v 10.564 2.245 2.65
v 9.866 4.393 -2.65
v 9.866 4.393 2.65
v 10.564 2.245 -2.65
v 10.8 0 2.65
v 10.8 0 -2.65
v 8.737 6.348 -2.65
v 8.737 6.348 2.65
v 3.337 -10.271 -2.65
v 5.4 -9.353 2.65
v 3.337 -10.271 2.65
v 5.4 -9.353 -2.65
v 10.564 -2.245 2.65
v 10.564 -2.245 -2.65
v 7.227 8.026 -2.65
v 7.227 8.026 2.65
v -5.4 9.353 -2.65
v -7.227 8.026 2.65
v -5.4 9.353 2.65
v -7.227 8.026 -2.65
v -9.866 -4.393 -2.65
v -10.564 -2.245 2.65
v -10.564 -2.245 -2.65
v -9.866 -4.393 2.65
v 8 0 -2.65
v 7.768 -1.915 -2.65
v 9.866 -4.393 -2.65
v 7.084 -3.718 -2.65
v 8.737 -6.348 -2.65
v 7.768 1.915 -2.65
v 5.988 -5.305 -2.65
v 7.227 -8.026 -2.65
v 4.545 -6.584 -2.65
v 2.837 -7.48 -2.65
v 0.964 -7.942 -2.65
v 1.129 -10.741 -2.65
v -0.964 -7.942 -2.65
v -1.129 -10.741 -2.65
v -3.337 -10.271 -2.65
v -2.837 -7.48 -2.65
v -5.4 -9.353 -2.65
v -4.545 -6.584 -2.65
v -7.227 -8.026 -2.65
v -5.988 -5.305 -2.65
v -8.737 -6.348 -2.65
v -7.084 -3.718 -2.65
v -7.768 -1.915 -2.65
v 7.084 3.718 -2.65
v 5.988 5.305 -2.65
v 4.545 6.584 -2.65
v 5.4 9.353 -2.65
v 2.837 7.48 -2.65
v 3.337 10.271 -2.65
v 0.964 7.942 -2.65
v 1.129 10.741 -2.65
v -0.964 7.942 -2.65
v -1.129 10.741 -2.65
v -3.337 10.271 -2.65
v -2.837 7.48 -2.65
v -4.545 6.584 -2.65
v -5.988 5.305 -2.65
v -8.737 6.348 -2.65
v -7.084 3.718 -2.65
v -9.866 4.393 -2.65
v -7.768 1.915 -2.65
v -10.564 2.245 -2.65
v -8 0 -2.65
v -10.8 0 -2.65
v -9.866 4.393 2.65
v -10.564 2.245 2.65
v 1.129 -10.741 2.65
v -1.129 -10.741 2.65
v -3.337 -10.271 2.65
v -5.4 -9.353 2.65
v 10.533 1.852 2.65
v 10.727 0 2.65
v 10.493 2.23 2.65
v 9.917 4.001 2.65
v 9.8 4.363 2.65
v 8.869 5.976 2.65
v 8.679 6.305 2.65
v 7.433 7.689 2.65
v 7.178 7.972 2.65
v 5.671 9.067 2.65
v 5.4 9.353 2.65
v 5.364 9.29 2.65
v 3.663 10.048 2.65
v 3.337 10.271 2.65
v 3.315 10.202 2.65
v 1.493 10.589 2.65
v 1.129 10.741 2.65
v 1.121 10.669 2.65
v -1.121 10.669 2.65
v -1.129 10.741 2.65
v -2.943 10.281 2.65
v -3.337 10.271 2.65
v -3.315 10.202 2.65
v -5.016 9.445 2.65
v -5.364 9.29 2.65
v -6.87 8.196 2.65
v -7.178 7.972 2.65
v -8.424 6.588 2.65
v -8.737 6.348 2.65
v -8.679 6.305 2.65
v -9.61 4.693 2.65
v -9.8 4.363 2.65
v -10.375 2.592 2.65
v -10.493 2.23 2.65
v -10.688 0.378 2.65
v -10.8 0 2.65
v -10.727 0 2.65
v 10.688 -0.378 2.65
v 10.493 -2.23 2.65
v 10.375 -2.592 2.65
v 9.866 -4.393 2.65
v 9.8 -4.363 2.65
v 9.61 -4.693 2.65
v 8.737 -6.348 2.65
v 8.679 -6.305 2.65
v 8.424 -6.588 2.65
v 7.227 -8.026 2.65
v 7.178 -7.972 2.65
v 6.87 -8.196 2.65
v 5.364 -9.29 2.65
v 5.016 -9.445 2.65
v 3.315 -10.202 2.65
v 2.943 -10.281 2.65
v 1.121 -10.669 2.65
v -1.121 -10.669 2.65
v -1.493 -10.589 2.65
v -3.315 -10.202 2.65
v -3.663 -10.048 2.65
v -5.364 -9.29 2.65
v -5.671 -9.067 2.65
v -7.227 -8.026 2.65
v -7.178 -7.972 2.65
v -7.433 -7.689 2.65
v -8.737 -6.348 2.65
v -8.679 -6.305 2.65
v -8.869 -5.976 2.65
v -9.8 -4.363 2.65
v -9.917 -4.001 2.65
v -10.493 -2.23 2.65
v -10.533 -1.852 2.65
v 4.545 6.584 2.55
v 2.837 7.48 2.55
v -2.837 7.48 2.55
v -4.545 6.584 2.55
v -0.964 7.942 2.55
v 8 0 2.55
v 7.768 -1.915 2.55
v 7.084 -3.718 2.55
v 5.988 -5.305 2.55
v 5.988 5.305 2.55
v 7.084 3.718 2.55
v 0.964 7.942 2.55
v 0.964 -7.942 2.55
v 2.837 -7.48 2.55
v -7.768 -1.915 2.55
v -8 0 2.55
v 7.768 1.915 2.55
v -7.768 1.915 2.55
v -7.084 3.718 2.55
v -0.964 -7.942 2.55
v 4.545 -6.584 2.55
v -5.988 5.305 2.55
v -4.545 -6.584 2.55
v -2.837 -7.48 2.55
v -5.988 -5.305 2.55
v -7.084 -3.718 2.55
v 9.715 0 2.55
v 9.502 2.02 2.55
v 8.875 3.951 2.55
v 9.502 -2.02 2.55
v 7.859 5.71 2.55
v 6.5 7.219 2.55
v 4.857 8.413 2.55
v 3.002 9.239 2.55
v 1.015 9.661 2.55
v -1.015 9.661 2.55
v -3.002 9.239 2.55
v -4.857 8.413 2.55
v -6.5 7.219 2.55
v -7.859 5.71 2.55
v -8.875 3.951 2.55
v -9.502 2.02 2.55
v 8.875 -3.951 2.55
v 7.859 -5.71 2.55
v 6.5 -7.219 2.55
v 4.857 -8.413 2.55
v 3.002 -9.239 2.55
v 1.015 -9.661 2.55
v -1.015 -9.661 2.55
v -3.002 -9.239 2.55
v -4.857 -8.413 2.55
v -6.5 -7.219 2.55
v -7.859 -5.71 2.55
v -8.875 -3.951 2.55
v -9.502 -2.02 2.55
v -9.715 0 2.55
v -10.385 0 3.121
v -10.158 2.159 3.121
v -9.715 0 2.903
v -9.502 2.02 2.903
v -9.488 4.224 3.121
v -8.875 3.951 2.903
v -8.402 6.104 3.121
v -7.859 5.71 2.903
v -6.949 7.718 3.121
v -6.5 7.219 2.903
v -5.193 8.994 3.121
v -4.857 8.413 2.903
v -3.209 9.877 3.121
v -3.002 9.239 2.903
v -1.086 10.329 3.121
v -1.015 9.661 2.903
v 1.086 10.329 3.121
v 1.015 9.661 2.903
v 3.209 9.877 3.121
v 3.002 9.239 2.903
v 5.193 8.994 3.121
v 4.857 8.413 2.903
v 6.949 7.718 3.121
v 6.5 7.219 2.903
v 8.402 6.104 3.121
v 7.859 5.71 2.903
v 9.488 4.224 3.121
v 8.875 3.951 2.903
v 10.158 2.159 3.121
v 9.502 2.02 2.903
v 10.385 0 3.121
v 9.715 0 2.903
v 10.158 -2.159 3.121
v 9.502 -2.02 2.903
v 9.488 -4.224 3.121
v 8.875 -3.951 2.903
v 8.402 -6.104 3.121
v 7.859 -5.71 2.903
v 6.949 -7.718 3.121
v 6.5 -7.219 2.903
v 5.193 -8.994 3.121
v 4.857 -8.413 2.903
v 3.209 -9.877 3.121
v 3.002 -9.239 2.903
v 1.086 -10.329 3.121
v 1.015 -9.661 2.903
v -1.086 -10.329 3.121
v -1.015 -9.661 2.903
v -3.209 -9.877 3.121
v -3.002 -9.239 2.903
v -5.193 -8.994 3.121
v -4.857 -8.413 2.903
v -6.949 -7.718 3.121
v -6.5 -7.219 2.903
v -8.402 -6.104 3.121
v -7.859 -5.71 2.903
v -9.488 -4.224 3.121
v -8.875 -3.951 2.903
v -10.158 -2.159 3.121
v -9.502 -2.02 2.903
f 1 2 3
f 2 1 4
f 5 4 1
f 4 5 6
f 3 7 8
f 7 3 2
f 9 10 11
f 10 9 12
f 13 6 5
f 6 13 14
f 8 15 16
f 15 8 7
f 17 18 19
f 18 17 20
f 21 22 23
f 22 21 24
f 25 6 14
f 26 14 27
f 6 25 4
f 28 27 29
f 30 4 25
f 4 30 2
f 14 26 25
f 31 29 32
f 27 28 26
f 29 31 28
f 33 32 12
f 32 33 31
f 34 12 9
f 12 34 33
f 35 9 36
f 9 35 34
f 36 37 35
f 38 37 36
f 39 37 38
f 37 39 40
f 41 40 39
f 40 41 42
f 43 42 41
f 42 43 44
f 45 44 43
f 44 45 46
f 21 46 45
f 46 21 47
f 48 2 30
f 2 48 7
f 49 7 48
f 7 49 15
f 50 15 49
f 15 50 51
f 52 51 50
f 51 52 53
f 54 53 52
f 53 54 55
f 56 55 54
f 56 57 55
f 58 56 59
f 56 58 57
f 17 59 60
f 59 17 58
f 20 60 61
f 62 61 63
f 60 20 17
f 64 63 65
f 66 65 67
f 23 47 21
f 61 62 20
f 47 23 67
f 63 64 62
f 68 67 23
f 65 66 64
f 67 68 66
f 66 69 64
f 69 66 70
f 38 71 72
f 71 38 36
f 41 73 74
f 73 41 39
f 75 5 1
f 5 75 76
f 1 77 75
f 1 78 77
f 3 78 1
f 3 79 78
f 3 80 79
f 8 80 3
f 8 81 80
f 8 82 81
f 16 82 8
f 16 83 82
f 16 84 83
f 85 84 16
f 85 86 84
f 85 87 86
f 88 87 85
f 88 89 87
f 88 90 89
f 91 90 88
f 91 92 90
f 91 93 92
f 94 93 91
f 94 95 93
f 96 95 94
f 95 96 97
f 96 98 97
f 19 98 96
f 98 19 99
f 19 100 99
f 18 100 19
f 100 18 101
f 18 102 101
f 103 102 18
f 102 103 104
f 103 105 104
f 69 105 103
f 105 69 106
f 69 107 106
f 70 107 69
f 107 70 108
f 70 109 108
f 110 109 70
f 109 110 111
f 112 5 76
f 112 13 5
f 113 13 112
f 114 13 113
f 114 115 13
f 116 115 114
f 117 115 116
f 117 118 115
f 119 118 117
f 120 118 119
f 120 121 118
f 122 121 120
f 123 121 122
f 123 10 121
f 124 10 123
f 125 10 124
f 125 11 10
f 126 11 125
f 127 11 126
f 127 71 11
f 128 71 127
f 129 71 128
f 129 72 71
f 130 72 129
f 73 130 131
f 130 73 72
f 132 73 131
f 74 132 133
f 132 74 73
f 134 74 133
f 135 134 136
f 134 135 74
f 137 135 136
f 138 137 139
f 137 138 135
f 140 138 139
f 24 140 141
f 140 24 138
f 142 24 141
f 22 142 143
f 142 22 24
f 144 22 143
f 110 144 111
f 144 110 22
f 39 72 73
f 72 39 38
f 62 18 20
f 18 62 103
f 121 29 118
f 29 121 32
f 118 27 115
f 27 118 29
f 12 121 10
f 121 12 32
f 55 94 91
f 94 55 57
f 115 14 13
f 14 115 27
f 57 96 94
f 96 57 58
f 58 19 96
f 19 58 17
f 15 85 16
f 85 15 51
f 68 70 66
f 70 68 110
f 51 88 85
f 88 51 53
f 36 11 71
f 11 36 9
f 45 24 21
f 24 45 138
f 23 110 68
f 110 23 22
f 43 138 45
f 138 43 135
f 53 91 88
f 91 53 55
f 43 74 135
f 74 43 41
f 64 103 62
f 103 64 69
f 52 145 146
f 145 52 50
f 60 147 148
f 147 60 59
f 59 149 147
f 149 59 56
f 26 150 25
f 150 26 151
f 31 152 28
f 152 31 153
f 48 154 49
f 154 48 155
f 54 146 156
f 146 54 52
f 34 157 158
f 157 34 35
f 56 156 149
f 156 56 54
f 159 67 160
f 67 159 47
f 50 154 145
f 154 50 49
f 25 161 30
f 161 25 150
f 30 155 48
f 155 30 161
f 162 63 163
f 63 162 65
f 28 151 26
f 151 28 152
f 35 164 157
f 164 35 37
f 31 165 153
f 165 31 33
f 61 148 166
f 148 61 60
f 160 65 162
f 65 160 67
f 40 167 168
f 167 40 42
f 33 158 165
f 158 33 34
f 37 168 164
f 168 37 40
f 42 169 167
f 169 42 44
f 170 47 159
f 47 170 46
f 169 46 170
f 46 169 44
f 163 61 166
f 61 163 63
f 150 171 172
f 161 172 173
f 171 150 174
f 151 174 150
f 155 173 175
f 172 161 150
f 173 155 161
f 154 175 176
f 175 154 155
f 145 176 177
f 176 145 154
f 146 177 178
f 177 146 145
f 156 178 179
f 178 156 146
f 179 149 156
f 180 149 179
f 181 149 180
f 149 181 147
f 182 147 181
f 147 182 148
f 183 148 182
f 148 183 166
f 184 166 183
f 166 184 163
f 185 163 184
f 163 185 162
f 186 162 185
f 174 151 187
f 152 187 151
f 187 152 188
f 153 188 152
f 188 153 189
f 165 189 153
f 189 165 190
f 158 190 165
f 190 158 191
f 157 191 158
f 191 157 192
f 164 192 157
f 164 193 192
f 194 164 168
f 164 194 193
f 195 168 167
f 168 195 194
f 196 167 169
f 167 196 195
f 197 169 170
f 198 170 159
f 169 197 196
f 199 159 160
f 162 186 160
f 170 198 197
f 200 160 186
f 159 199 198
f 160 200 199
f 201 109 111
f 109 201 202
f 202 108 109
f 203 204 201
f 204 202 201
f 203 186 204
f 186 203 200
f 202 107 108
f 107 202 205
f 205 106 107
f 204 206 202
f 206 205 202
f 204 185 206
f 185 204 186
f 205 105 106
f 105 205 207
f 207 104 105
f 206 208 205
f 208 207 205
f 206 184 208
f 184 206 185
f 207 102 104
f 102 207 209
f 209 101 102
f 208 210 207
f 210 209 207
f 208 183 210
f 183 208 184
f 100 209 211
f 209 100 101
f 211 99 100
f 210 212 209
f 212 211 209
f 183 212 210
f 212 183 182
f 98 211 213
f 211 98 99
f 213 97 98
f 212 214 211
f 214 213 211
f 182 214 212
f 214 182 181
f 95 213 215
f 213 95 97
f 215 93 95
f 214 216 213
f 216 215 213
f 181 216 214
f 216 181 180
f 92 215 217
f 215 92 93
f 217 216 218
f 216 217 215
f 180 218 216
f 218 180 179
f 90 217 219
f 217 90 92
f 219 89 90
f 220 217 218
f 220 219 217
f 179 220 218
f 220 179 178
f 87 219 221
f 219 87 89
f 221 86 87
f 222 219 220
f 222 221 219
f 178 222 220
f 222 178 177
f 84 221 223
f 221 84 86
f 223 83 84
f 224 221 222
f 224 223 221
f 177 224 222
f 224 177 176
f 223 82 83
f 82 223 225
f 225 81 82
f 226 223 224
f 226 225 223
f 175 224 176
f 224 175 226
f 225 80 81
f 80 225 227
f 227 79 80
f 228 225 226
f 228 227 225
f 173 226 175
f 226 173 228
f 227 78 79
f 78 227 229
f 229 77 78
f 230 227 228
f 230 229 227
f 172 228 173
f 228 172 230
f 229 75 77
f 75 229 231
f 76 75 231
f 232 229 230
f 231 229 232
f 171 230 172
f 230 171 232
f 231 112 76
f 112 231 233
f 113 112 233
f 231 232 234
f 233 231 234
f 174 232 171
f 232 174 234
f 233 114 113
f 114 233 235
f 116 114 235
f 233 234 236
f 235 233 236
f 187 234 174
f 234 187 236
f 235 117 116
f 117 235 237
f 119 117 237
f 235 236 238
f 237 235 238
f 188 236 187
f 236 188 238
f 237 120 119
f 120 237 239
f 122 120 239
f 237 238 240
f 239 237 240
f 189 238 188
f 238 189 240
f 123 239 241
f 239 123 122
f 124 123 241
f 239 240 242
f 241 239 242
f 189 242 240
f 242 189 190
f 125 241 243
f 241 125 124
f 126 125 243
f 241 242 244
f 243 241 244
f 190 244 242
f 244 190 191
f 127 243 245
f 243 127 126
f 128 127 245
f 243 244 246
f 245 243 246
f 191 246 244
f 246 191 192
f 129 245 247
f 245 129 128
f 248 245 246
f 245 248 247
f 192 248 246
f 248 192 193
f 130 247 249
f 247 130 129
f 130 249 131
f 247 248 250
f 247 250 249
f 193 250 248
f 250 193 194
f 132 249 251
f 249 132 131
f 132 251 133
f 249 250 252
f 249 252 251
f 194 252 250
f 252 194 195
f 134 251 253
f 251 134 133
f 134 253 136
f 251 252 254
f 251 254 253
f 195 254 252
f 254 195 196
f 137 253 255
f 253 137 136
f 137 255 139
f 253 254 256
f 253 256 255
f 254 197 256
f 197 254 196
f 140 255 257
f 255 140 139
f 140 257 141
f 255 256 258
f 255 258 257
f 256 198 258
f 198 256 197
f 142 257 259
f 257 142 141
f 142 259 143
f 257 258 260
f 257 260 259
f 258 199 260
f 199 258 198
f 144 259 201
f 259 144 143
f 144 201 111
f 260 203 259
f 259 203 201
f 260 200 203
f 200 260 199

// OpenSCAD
// Parameters
outer_radius = 10.8; //[5.4:21.6:0.1]
inner_radius = 8.0; //[4.0:16.0:0.1]
height = 5.3; //[2.65:10.6:0.1]
resolution_factor = 1; //[0.5:2:0.1]
overlap = 1; //[0.5:2:0.1]
chamfer_size = 0.6; //[0.3:1.2:0.05]
fillet_radius = 0.6; //[0.3:1.2:0.05]

// Base Shapes
module outer_cylinder() {
  cylinder(h=height, r=outer_radius, center=true);
}

module inner_bore() {
  cylinder(h=height + 2*overlap, r=inner_radius, center=true);
}

module edge_chamfer() {
  translate([0, 0, height/2 - (chamfer_size*resolution_factor)/2 + overlap/2])
    cylinder(h=chamfer_size*resolution_factor, r1=outer_radius, r2=outer_radius - chamfer_size*resolution_factor, center=true);
}

module edge_fillet() {
  translate([0, 0, height/2 - fillet_radius*resolution_factor + overlap/2])
    rotate_extrude() 
      translate([outer_radius - fillet_radius*resolution_factor, 0, 0])
        circle(r=fillet_radius*resolution_factor);
}

// Operations
module ring_body() {
  difference() {
    outer_cylinder();
    inner_bore();
  }
}

module ring_minus_chamfer() {
  difference() {
    ring_body();
    edge_chamfer();
  }
}

module final_ring() {
  union() {
    ring_minus_chamfer();
    edge_fillet();
  }
}

// Final Output
final_ring();
